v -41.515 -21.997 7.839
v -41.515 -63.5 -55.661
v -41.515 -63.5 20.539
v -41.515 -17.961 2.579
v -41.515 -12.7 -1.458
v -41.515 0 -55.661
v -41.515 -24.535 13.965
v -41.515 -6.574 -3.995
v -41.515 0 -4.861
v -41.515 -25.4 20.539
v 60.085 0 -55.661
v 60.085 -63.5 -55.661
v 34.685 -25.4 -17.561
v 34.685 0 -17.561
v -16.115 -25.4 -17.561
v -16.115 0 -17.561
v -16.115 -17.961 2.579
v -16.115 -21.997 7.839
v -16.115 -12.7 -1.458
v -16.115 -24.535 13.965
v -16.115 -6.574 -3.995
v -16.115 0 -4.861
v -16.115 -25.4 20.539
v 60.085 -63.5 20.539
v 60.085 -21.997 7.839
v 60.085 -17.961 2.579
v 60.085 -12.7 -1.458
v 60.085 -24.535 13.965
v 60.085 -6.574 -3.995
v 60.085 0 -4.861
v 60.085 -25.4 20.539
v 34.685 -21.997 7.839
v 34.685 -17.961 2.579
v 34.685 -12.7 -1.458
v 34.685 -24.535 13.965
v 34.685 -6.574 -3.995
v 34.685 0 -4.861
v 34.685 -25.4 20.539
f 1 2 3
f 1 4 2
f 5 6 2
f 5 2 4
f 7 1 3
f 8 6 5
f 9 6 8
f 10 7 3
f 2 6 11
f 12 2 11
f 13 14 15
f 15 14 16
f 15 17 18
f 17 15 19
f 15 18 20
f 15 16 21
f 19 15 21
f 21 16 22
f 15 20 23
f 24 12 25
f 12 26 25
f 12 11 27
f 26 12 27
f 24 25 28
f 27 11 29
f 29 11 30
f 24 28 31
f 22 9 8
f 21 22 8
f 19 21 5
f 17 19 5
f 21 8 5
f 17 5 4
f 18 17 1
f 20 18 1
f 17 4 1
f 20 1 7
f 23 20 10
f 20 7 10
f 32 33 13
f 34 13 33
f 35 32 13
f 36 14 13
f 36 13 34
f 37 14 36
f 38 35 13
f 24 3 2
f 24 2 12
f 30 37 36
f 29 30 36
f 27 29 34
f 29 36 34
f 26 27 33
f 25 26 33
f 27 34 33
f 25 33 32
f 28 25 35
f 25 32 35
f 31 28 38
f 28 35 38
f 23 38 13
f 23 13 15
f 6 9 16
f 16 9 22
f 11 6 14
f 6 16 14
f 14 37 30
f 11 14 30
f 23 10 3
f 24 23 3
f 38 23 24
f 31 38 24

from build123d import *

# Parameters (mm, degrees)
F0_W     = 101.6
F0_H     = 76.2
F1_DEPTH = 63.5
F2_W     = 50.8
F2_H     = 38.1
F3_DEPTH = 25.4
F5_DEPTH = 101.601


with BuildPart() as f1:
    # F0 (on Front) → F1 (new body)
    with BuildSketch(Plane.XZ):
        with Locations((9.285491, -17.560551)):
            Rectangle(F0_W, F0_H)
    extrude(amount=F1_DEPTH)

    # F2 (on face) → F3 (cut)
    with BuildSketch(Plane(origin=(0, 0, 0), x_dir=(-1, 0, 0), z_dir=(0, 1, 0))):
        with Locations((-9.285491, 1.489449)):
            Rectangle(F2_W, F2_H)
    extrude(amount=-F3_DEPTH, mode=Mode.SUBTRACT)

    # F4 (on face) → F5 (cut, through all)
    with BuildSketch(Plane(origin=(-41.514509, 0, 0), x_dir=(0, -1, 0), z_dir=(-1, 0, 0))):
        with BuildLine():
            Line((0, 20.539449), (0, -4.860551))
            ThreePointArc((0, -4.860551), (17.960512, 2.578937), (25.4, 20.539449))
            Line((25.4, 20.539449), (0, 20.539449))
        make_face()
    extrude(amount=-F5_DEPTH, mode=Mode.SUBTRACT)


solid = f1.part
